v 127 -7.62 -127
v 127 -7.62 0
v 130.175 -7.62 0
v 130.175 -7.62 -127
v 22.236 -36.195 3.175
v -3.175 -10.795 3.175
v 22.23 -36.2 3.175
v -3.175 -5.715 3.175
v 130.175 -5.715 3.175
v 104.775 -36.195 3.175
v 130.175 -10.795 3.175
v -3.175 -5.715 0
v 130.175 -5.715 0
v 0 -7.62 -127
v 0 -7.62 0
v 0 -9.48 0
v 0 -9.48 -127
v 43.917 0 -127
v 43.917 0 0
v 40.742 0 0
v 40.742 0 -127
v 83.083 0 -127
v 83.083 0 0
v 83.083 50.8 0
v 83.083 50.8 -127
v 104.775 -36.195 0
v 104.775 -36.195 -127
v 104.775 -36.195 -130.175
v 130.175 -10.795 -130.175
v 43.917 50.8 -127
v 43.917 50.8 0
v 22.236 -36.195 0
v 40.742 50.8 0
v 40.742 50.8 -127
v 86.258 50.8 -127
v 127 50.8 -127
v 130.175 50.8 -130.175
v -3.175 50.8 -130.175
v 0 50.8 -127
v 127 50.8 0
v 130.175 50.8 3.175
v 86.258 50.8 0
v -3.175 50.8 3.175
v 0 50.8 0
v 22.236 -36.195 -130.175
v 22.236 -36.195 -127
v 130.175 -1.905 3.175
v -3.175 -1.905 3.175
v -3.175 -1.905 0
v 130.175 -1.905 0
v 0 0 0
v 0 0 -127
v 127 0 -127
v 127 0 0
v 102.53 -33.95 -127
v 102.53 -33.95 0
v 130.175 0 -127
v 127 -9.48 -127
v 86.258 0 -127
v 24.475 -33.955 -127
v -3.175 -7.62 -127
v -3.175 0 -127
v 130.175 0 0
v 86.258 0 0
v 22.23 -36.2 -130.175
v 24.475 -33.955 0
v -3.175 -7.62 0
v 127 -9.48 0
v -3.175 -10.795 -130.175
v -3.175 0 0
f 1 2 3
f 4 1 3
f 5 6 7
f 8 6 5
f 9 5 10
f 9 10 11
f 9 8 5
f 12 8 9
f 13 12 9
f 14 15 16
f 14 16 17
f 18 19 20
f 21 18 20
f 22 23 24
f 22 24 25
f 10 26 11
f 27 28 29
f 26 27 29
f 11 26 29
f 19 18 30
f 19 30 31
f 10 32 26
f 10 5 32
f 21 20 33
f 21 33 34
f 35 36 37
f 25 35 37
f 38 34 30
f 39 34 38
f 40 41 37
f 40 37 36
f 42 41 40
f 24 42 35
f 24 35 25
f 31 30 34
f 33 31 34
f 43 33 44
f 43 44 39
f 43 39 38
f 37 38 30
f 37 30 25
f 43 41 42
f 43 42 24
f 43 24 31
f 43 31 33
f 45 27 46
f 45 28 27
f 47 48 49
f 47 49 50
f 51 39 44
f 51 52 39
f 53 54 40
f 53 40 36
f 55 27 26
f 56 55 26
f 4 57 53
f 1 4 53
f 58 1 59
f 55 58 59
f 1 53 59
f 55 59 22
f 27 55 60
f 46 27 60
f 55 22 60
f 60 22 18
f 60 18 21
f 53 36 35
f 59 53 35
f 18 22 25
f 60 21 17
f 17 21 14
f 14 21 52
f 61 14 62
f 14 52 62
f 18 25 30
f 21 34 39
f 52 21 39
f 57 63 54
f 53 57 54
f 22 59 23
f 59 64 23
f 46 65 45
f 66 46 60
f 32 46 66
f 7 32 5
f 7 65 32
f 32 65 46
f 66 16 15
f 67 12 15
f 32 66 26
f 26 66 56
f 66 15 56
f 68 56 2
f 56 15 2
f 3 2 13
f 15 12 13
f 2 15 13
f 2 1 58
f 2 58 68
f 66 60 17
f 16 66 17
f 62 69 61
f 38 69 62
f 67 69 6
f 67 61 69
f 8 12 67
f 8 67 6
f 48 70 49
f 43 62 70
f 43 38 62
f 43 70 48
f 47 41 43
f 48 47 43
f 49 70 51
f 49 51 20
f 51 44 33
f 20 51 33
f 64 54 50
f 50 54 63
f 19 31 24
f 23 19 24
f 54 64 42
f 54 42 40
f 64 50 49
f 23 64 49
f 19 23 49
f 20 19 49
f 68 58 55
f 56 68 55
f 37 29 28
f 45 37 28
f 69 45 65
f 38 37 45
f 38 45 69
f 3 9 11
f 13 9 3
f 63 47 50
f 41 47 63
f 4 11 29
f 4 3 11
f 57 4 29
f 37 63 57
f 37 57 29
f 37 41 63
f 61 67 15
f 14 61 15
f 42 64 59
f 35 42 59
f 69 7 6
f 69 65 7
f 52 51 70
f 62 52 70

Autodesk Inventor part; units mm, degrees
ref_plane "YZ Plane" through (0, 0, 0) normal (1, 0, 0) x (0, 1, 0)
ref_plane "XZ Plane" through (0, 0, 0) normal (0, 1, 0) x (-1, 0, 0)
ref_plane "XY Plane" through (0, 0, 0) normal (0, 0, 1) x (1, 0, 0)
sketch "Sketch2" plane through (0, 0, 0) normal (0, 1, 0) x (-1, 0, 0)
  line L0 (0, 0) -> (-127, 0)
  line L1 (-127, 0) -> (-127, -127)
  line L2 (-127, -127) -> (0, -127)
  line L3 (0, -127) -> (0, 0)
  line L4 (0, 0) -> (-40.7416, 0)
  line L5 (-40.7416, 0) -> (-40.7416, -127)
  line L6 (-40.7416, -127) -> (0, -127)
  line L7 (0, -127) -> (0, 0)
  line L8 (3.175, 3.175) -> (-130.175, 3.175)
  line L9 (-130.175, 3.175) -> (-130.175, -130.175)
  line L10 (-130.175, -130.175) -> (3.175, -130.175)
  line L11 (3.175, -130.175) -> (3.175, 3.175)
  line L12 (-127, 0) -> (-86.2584, 0)
  line L13 (-86.2584, 0) -> (-86.2584, -127)
  line L14 (-86.2584, -127) -> (-127, -127)
  line L15 (-127, -127) -> (-127, 0)
  line L16 (-40.7416, -44.9087) -> (-43.9166, -44.9087) construction
  line L17 (-86.2584, -51.4533) -> (-83.0834, -51.4533) construction
  line L18 (-43.9166, 0) -> (-83.0834, 0)
  line L19 (-83.0834, 0) -> (-83.0834, -127)
  line L20 (-83.0834, -127) -> (-43.9166, -127)
  line L21 (-43.9166, -127) -> (-43.9166, 0)
  dimension "d11" = 127
  dimension "d12" = 127
  dimension "d13" = 40.7416
  dimension "d14" = 3.175
  dimension "d15" = 40.7416
  dimension "d16" = 3.175
  dimension "d17" = 3.175
extrude "Extrusion2" add sketch "Sketch2" along normal blind 50.8 contours L5 L2 L21 L0 | L19 L2 L13 L0 | L11 L10 L9 L8
sketch "Sketch3" plane through (0, 0, 0) normal (0, -1, 0) x (1, 0, 0)
  line L0 (130.175, 3.175) -> (130.175, -130.175) projected
  line L1 (-3.175, -130.175) -> (-3.175, 3.175) projected
  line L2 (130.175, 3.175) -> (-3.175, 3.175)
  line L3 (-3.175, 3.175) -> (-3.175, 0)
  line L4 (-3.175, 0) -> (130.175, 0)
  line L5 (130.175, 0) -> (130.175, 3.175)
  line L6 (130.175, -130.175) -> (-3.175, -130.175)
  line L7 (-3.175, -130.175) -> (-3.175, -127)
  line L8 (-3.175, -127) -> (130.175, -127)
  line L9 (130.175, -127) -> (130.175, -130.175)
  point P0 (0, 0)
  dimension "d20" = 133.35
  dimension "d21" = 3.175
extrude "Extrusion3" add sketch "Sketch3" along normal blind 1.905 contours L0 L4 L1 L2
sketch "Sketch4" plane through (0, 0, 0) normal (0, -1, 0) x (1, 0, 0)
  line L0 (130.175, 0) -> (130.175, -130.175) projected
  line L1 (130.175, -130.175) -> (-3.175, -130.175)
  line L2 (-3.175, -130.175) -> (-3.175, -127)
  line L3 (-3.175, -127) -> (130.175, -127)
  line L4 (130.175, -127) -> (130.175, -130.175)
  point P0 (0, 0)
  dimension "d24" = 133.35
  dimension "d25" = 3.175
extrude "Extrusion4" add sketch "Sketch4" along normal blind 7.62
sketch "Sketch5" plane through (0, -7.62, 0) normal (0, -1, 0) x (1, 0, 0)
  line L0 (130.175, -130.175) -> (-3.175, -130.175) projected
  line L1 (130.175, -130.175) -> (-3.175, -130.175)
  line L2 (-3.175, -130.175) -> (-3.175, 3.175)
  line L3 (-3.175, 3.175) -> (130.175, 3.175)
  line L4 (130.175, 3.175) -> (130.175, -130.175)
  line L5 (127, 0) -> (0, 0)
  line L6 (0, 0) -> (0, -127)
  line L7 (0, -127) -> (127, -127)
  line L8 (127, -127) -> (127, 0)
  point P0 (0, 0)
  dimension "d32" = 3.175
extrude "Extrusion5" add sketch "Sketch5" along normal blind 3.175
sketch "Sketch6" plane through (0, -10.795, 0) normal (0, -1, 0) x (1, 0, 0)
  line L0 (130.175, -127) -> (130.175, 3.175) projected
  line L1 (-3.175, -130.175) -> (-3.175, 3.175) projected
  line L2 (130.175, 3.175) -> (-3.175, 3.175)
  line L3 (-3.175, 3.175) -> (-3.175, 0)
  line L4 (-3.175, 0) -> (130.175, 0)
  line L5 (130.175, 0) -> (130.175, 3.175)
  point P0 (0, 0)
extrude "Extrusion6" add sketch "Sketch6" against normal blind 5.08
sketch "Sketch7" plane through (-3.175, -10.795, 3.175) normal (0, 0, 1) x (1, 0, 0)
  line L0 (0, 0) -> (133.35, 0) construction
  line L1 (0, 0) -> (0, -25.4) construction
  line L2 (0, -25.4) -> (25.4, -25.4) construction
  line L3 (133.35, 0) -> (133.35, -25.4) construction
  line L4 (133.35, -25.4) -> (107.95, -25.4) construction
  line L5 (0, 0) -> (25.4, -25.4)
  line L6 (25.4, -25.4) -> (107.95, -25.4)
  line L7 (107.95, -25.4) -> (133.35, 0)
  line L8 (0, 0) -> (133.35, 0)
  point P0 (3.175, 10.795)
  dimension "d33" = 25.4
  dimension "d34" = 25.4
  dimension "d35" = 25.4
  dimension "d36" = 25.4
extrude "Extrusion7" add sketch "Sketch7" against normal blind 3.175
sketch "Sketch8" plane through (130.175, 50.8, -130.175) normal (0, 0, -1) x (-1, 0, 0)
  line L0 (107.95, -86.995) -> (133.35, -61.595) projected
  line L1 (133.35, -61.595) -> (107.95, -86.995)
  line L2 (25.4, -86.995) -> (107.95, -86.995) projected
  line L3 (107.95, -86.995) -> (25.4, -86.995)
  line L4 (0, -56.515) -> (0, -61.595) projected
  line L5 (25.4, -86.995) -> (0, -61.595)
  line L6 (0, -61.595) -> (133.35, -61.595)
  point P0 (130.175, -50.8)
extrude "Extrusion8" add sketch "Sketch8" against normal blind 3.175
sketch "Sketch9" plane through (22.225, -36.195, -127) normal (-0.7071068, -0.7071068, 0) x (-0.7071068, 0.7071068, 0)
  line L0 (35.921, 0) -> (35.921, 3.175) projected
  line L1 (39.5131, -130.175) -> (-54.7796, -130.175) projected
  line L2 (35.921, 3.175) -> (-0.0076, 3.175)
  line L3 (-0.0076, 3.175) -> (-0.0076, -130.175)
  line L4 (-0.0076, -130.175) -> (35.921, -130.175)
  line L5 (35.921, -130.175) -> (35.921, 3.175)
  point P0 (41.3092, -127)
  point P1 (35.921, -130.175)
  point P2 (35.921, 0)
extrude "Extrusion9" add sketch "Sketch9" against normal blind 3.175
sketch "Sketch10" plane through (104.775, -36.195, 3.175) normal (0.7071068, -0.7071068, 0) x (-0.7071068, -0.7071068, 0)
  line L0 (0, 0) -> (0, 3.175) projected
  line L1 (-35.921, 133.35) -> (0, 133.35) projected
  line L2 (0, 0) -> (-35.921, 0)
  line L3 (-35.921, 0) -> (-35.921, 133.35)
  line L4 (-35.921, 133.35) -> (0, 133.35)
  line L5 (0, 133.35) -> (0, 0)
  point P0 (48.4934, 3.175)
extrude "Extrusion10" add sketch "Sketch10" against normal blind 3.175
properties part number "BeadCompartments_4"
